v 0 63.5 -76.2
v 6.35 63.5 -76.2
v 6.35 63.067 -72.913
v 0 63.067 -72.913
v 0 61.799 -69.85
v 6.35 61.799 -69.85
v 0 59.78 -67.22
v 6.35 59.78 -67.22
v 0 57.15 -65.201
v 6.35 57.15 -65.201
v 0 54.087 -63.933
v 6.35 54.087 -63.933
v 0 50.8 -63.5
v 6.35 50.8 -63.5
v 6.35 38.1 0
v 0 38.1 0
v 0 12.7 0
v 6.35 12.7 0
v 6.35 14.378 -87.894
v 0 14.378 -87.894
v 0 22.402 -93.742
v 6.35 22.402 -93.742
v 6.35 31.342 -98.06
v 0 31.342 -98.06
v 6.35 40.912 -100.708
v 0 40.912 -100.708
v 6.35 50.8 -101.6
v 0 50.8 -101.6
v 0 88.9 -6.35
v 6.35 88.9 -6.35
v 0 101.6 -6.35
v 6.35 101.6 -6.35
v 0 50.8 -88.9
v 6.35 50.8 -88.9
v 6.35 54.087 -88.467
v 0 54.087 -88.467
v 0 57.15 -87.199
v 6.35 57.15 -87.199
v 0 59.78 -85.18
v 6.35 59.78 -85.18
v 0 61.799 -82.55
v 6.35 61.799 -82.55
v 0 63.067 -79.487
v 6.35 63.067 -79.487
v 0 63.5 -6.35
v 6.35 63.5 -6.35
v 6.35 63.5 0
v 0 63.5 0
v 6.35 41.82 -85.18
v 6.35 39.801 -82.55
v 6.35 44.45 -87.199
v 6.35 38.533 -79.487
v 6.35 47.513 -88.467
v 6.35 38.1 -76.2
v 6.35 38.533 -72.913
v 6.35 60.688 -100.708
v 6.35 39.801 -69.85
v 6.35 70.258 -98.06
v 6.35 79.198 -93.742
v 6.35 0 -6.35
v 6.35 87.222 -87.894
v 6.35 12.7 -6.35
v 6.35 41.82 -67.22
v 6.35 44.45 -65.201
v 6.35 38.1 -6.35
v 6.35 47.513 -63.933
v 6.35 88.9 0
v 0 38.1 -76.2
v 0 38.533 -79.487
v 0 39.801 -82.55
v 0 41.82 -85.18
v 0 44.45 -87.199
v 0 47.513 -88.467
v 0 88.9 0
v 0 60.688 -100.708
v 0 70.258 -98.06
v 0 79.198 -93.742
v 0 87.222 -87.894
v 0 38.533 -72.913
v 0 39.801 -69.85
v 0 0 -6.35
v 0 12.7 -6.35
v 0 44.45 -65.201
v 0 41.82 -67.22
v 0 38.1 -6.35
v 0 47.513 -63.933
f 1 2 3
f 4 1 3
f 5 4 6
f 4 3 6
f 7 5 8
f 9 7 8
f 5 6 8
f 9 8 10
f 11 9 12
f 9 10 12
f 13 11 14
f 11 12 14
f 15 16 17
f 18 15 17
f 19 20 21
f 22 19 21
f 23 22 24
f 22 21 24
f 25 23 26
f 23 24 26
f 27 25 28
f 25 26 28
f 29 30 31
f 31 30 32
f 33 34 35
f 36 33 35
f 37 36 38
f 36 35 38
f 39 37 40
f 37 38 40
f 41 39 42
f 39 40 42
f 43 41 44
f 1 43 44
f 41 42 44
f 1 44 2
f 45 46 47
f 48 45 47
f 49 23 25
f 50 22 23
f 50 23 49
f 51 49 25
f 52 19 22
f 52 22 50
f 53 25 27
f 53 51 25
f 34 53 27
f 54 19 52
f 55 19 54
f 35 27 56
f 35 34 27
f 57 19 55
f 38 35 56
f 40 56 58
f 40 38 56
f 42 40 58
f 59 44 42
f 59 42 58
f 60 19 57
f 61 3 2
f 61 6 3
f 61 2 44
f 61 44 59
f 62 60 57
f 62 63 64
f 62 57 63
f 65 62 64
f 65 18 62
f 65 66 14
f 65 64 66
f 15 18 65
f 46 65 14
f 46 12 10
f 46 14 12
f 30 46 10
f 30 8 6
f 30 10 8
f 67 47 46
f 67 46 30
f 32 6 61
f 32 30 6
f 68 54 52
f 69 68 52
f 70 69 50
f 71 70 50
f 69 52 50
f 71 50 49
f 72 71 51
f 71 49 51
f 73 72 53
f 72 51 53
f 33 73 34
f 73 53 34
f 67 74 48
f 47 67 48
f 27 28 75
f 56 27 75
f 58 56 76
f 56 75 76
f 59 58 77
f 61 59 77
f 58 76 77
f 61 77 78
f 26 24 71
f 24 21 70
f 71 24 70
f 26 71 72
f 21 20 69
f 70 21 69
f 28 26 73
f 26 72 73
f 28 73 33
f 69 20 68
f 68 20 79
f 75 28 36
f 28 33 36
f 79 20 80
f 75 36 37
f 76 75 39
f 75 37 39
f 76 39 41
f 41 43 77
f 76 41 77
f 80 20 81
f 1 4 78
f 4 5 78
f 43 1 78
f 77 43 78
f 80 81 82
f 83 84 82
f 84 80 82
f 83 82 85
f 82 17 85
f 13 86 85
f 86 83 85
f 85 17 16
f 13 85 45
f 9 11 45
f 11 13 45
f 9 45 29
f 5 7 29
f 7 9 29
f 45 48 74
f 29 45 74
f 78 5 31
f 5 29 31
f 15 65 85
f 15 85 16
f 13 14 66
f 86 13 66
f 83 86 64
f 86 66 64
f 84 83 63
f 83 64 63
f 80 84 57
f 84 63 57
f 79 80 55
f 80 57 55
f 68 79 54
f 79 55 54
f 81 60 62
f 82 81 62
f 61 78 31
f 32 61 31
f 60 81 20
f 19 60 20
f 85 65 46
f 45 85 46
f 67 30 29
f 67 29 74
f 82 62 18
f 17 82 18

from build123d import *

# Parameters (mm, degrees)
F1_DEPTH = 6.35
F2_W     = 12.7
F2_H     = 6.35
F3_DEPTH = 25.4
F5_DEPTH = 6.351


# Not quite as in the source:
# - a feature names something its author has since deleted; it is built from what else it names


with BuildPart() as f1:
    # F0 (on Right) → F1 (new body)
    with BuildSketch(Plane.YZ):
        with BuildLine():
            Line((50.8, 0), (0, 0))
            Line((0, 0), (0, -6.35))
            Line((0, -6.35), (14.3783799252, -87.8938446653))
            ThreePointArc((14.3783799252, -87.8938446653), (31.3423979963, -98.0600456848), (50.8, -101.6))
            Line((50.8, -101.6), (50.8, 0))
        make_face()
        with BuildLine():
            Line((101.6, 0), (50.8, 0))
            Line((50.8, 0), (50.8, -101.6))
            ThreePointArc((50.8, -101.6), (70.2576020037, -98.0600456848), (87.2216200748, -87.8938446653))
            Line((87.2216200748, -87.8938446653), (101.6, -6.35))
            Line((101.6, -6.35), (101.6, 0))
        make_face()
    extrude(amount=F1_DEPTH)

    # F2 (on face) → F3 (cut)
    with BuildSketch(Plane.YZ.offset(6.35)):
        with Locations((95.25, -3.175)):
            Rectangle(F2_W, F2_H)
        with Locations((44.45, -3.175)):
            Rectangle(F2_W, F2_H)
        with Locations((6.35, -3.175)):
            Rectangle(F2_W, F2_H)
        with Locations((57.15, -3.175)):
            Rectangle(F2_W, F2_H)
    extrude(amount=-F3_DEPTH, mode=Mode.SUBTRACT)

    # F4 (on face) → F5 (cut, through all)
    with BuildSketch(Plane.YZ.offset(6.35)):
        with BuildLine():
            Line((50.8, -88.9), (50.8, -76.2))
            Line((50.8, -76.2), (38.1, -76.2))
            ThreePointArc((38.1, -76.2), (41.8197438789, -85.1802561211), (50.8, -88.9))
        make_face()
        with BuildLine():
            Line((50.8, -76.2), (63.5, -76.2))
            ThreePointArc((63.5, -76.2), (59.7802561211, -67.2197438789), (50.8, -63.5))
            Line((50.8, -63.5), (50.8, -76.2))
        make_face()
        with BuildLine():
            ThreePointArc((50.8, -88.9), (59.7802561211, -85.1802561211), (63.5, -76.2))
            Line((63.5, -76.2), (50.8, -76.2))
            Line((50.8, -76.2), (50.8, -88.9))
        make_face()
        with BuildLine():
            Line((38.1, -76.2), (50.8, -76.2))
            Line((50.8, -76.2), (50.8, -63.5))
            ThreePointArc((50.8, -63.5), (41.8197438789, -67.2197438789), (38.1, -76.2))
        make_face()
    extrude(amount=-F5_DEPTH, mode=Mode.SUBTRACT)


solid = f1.part
